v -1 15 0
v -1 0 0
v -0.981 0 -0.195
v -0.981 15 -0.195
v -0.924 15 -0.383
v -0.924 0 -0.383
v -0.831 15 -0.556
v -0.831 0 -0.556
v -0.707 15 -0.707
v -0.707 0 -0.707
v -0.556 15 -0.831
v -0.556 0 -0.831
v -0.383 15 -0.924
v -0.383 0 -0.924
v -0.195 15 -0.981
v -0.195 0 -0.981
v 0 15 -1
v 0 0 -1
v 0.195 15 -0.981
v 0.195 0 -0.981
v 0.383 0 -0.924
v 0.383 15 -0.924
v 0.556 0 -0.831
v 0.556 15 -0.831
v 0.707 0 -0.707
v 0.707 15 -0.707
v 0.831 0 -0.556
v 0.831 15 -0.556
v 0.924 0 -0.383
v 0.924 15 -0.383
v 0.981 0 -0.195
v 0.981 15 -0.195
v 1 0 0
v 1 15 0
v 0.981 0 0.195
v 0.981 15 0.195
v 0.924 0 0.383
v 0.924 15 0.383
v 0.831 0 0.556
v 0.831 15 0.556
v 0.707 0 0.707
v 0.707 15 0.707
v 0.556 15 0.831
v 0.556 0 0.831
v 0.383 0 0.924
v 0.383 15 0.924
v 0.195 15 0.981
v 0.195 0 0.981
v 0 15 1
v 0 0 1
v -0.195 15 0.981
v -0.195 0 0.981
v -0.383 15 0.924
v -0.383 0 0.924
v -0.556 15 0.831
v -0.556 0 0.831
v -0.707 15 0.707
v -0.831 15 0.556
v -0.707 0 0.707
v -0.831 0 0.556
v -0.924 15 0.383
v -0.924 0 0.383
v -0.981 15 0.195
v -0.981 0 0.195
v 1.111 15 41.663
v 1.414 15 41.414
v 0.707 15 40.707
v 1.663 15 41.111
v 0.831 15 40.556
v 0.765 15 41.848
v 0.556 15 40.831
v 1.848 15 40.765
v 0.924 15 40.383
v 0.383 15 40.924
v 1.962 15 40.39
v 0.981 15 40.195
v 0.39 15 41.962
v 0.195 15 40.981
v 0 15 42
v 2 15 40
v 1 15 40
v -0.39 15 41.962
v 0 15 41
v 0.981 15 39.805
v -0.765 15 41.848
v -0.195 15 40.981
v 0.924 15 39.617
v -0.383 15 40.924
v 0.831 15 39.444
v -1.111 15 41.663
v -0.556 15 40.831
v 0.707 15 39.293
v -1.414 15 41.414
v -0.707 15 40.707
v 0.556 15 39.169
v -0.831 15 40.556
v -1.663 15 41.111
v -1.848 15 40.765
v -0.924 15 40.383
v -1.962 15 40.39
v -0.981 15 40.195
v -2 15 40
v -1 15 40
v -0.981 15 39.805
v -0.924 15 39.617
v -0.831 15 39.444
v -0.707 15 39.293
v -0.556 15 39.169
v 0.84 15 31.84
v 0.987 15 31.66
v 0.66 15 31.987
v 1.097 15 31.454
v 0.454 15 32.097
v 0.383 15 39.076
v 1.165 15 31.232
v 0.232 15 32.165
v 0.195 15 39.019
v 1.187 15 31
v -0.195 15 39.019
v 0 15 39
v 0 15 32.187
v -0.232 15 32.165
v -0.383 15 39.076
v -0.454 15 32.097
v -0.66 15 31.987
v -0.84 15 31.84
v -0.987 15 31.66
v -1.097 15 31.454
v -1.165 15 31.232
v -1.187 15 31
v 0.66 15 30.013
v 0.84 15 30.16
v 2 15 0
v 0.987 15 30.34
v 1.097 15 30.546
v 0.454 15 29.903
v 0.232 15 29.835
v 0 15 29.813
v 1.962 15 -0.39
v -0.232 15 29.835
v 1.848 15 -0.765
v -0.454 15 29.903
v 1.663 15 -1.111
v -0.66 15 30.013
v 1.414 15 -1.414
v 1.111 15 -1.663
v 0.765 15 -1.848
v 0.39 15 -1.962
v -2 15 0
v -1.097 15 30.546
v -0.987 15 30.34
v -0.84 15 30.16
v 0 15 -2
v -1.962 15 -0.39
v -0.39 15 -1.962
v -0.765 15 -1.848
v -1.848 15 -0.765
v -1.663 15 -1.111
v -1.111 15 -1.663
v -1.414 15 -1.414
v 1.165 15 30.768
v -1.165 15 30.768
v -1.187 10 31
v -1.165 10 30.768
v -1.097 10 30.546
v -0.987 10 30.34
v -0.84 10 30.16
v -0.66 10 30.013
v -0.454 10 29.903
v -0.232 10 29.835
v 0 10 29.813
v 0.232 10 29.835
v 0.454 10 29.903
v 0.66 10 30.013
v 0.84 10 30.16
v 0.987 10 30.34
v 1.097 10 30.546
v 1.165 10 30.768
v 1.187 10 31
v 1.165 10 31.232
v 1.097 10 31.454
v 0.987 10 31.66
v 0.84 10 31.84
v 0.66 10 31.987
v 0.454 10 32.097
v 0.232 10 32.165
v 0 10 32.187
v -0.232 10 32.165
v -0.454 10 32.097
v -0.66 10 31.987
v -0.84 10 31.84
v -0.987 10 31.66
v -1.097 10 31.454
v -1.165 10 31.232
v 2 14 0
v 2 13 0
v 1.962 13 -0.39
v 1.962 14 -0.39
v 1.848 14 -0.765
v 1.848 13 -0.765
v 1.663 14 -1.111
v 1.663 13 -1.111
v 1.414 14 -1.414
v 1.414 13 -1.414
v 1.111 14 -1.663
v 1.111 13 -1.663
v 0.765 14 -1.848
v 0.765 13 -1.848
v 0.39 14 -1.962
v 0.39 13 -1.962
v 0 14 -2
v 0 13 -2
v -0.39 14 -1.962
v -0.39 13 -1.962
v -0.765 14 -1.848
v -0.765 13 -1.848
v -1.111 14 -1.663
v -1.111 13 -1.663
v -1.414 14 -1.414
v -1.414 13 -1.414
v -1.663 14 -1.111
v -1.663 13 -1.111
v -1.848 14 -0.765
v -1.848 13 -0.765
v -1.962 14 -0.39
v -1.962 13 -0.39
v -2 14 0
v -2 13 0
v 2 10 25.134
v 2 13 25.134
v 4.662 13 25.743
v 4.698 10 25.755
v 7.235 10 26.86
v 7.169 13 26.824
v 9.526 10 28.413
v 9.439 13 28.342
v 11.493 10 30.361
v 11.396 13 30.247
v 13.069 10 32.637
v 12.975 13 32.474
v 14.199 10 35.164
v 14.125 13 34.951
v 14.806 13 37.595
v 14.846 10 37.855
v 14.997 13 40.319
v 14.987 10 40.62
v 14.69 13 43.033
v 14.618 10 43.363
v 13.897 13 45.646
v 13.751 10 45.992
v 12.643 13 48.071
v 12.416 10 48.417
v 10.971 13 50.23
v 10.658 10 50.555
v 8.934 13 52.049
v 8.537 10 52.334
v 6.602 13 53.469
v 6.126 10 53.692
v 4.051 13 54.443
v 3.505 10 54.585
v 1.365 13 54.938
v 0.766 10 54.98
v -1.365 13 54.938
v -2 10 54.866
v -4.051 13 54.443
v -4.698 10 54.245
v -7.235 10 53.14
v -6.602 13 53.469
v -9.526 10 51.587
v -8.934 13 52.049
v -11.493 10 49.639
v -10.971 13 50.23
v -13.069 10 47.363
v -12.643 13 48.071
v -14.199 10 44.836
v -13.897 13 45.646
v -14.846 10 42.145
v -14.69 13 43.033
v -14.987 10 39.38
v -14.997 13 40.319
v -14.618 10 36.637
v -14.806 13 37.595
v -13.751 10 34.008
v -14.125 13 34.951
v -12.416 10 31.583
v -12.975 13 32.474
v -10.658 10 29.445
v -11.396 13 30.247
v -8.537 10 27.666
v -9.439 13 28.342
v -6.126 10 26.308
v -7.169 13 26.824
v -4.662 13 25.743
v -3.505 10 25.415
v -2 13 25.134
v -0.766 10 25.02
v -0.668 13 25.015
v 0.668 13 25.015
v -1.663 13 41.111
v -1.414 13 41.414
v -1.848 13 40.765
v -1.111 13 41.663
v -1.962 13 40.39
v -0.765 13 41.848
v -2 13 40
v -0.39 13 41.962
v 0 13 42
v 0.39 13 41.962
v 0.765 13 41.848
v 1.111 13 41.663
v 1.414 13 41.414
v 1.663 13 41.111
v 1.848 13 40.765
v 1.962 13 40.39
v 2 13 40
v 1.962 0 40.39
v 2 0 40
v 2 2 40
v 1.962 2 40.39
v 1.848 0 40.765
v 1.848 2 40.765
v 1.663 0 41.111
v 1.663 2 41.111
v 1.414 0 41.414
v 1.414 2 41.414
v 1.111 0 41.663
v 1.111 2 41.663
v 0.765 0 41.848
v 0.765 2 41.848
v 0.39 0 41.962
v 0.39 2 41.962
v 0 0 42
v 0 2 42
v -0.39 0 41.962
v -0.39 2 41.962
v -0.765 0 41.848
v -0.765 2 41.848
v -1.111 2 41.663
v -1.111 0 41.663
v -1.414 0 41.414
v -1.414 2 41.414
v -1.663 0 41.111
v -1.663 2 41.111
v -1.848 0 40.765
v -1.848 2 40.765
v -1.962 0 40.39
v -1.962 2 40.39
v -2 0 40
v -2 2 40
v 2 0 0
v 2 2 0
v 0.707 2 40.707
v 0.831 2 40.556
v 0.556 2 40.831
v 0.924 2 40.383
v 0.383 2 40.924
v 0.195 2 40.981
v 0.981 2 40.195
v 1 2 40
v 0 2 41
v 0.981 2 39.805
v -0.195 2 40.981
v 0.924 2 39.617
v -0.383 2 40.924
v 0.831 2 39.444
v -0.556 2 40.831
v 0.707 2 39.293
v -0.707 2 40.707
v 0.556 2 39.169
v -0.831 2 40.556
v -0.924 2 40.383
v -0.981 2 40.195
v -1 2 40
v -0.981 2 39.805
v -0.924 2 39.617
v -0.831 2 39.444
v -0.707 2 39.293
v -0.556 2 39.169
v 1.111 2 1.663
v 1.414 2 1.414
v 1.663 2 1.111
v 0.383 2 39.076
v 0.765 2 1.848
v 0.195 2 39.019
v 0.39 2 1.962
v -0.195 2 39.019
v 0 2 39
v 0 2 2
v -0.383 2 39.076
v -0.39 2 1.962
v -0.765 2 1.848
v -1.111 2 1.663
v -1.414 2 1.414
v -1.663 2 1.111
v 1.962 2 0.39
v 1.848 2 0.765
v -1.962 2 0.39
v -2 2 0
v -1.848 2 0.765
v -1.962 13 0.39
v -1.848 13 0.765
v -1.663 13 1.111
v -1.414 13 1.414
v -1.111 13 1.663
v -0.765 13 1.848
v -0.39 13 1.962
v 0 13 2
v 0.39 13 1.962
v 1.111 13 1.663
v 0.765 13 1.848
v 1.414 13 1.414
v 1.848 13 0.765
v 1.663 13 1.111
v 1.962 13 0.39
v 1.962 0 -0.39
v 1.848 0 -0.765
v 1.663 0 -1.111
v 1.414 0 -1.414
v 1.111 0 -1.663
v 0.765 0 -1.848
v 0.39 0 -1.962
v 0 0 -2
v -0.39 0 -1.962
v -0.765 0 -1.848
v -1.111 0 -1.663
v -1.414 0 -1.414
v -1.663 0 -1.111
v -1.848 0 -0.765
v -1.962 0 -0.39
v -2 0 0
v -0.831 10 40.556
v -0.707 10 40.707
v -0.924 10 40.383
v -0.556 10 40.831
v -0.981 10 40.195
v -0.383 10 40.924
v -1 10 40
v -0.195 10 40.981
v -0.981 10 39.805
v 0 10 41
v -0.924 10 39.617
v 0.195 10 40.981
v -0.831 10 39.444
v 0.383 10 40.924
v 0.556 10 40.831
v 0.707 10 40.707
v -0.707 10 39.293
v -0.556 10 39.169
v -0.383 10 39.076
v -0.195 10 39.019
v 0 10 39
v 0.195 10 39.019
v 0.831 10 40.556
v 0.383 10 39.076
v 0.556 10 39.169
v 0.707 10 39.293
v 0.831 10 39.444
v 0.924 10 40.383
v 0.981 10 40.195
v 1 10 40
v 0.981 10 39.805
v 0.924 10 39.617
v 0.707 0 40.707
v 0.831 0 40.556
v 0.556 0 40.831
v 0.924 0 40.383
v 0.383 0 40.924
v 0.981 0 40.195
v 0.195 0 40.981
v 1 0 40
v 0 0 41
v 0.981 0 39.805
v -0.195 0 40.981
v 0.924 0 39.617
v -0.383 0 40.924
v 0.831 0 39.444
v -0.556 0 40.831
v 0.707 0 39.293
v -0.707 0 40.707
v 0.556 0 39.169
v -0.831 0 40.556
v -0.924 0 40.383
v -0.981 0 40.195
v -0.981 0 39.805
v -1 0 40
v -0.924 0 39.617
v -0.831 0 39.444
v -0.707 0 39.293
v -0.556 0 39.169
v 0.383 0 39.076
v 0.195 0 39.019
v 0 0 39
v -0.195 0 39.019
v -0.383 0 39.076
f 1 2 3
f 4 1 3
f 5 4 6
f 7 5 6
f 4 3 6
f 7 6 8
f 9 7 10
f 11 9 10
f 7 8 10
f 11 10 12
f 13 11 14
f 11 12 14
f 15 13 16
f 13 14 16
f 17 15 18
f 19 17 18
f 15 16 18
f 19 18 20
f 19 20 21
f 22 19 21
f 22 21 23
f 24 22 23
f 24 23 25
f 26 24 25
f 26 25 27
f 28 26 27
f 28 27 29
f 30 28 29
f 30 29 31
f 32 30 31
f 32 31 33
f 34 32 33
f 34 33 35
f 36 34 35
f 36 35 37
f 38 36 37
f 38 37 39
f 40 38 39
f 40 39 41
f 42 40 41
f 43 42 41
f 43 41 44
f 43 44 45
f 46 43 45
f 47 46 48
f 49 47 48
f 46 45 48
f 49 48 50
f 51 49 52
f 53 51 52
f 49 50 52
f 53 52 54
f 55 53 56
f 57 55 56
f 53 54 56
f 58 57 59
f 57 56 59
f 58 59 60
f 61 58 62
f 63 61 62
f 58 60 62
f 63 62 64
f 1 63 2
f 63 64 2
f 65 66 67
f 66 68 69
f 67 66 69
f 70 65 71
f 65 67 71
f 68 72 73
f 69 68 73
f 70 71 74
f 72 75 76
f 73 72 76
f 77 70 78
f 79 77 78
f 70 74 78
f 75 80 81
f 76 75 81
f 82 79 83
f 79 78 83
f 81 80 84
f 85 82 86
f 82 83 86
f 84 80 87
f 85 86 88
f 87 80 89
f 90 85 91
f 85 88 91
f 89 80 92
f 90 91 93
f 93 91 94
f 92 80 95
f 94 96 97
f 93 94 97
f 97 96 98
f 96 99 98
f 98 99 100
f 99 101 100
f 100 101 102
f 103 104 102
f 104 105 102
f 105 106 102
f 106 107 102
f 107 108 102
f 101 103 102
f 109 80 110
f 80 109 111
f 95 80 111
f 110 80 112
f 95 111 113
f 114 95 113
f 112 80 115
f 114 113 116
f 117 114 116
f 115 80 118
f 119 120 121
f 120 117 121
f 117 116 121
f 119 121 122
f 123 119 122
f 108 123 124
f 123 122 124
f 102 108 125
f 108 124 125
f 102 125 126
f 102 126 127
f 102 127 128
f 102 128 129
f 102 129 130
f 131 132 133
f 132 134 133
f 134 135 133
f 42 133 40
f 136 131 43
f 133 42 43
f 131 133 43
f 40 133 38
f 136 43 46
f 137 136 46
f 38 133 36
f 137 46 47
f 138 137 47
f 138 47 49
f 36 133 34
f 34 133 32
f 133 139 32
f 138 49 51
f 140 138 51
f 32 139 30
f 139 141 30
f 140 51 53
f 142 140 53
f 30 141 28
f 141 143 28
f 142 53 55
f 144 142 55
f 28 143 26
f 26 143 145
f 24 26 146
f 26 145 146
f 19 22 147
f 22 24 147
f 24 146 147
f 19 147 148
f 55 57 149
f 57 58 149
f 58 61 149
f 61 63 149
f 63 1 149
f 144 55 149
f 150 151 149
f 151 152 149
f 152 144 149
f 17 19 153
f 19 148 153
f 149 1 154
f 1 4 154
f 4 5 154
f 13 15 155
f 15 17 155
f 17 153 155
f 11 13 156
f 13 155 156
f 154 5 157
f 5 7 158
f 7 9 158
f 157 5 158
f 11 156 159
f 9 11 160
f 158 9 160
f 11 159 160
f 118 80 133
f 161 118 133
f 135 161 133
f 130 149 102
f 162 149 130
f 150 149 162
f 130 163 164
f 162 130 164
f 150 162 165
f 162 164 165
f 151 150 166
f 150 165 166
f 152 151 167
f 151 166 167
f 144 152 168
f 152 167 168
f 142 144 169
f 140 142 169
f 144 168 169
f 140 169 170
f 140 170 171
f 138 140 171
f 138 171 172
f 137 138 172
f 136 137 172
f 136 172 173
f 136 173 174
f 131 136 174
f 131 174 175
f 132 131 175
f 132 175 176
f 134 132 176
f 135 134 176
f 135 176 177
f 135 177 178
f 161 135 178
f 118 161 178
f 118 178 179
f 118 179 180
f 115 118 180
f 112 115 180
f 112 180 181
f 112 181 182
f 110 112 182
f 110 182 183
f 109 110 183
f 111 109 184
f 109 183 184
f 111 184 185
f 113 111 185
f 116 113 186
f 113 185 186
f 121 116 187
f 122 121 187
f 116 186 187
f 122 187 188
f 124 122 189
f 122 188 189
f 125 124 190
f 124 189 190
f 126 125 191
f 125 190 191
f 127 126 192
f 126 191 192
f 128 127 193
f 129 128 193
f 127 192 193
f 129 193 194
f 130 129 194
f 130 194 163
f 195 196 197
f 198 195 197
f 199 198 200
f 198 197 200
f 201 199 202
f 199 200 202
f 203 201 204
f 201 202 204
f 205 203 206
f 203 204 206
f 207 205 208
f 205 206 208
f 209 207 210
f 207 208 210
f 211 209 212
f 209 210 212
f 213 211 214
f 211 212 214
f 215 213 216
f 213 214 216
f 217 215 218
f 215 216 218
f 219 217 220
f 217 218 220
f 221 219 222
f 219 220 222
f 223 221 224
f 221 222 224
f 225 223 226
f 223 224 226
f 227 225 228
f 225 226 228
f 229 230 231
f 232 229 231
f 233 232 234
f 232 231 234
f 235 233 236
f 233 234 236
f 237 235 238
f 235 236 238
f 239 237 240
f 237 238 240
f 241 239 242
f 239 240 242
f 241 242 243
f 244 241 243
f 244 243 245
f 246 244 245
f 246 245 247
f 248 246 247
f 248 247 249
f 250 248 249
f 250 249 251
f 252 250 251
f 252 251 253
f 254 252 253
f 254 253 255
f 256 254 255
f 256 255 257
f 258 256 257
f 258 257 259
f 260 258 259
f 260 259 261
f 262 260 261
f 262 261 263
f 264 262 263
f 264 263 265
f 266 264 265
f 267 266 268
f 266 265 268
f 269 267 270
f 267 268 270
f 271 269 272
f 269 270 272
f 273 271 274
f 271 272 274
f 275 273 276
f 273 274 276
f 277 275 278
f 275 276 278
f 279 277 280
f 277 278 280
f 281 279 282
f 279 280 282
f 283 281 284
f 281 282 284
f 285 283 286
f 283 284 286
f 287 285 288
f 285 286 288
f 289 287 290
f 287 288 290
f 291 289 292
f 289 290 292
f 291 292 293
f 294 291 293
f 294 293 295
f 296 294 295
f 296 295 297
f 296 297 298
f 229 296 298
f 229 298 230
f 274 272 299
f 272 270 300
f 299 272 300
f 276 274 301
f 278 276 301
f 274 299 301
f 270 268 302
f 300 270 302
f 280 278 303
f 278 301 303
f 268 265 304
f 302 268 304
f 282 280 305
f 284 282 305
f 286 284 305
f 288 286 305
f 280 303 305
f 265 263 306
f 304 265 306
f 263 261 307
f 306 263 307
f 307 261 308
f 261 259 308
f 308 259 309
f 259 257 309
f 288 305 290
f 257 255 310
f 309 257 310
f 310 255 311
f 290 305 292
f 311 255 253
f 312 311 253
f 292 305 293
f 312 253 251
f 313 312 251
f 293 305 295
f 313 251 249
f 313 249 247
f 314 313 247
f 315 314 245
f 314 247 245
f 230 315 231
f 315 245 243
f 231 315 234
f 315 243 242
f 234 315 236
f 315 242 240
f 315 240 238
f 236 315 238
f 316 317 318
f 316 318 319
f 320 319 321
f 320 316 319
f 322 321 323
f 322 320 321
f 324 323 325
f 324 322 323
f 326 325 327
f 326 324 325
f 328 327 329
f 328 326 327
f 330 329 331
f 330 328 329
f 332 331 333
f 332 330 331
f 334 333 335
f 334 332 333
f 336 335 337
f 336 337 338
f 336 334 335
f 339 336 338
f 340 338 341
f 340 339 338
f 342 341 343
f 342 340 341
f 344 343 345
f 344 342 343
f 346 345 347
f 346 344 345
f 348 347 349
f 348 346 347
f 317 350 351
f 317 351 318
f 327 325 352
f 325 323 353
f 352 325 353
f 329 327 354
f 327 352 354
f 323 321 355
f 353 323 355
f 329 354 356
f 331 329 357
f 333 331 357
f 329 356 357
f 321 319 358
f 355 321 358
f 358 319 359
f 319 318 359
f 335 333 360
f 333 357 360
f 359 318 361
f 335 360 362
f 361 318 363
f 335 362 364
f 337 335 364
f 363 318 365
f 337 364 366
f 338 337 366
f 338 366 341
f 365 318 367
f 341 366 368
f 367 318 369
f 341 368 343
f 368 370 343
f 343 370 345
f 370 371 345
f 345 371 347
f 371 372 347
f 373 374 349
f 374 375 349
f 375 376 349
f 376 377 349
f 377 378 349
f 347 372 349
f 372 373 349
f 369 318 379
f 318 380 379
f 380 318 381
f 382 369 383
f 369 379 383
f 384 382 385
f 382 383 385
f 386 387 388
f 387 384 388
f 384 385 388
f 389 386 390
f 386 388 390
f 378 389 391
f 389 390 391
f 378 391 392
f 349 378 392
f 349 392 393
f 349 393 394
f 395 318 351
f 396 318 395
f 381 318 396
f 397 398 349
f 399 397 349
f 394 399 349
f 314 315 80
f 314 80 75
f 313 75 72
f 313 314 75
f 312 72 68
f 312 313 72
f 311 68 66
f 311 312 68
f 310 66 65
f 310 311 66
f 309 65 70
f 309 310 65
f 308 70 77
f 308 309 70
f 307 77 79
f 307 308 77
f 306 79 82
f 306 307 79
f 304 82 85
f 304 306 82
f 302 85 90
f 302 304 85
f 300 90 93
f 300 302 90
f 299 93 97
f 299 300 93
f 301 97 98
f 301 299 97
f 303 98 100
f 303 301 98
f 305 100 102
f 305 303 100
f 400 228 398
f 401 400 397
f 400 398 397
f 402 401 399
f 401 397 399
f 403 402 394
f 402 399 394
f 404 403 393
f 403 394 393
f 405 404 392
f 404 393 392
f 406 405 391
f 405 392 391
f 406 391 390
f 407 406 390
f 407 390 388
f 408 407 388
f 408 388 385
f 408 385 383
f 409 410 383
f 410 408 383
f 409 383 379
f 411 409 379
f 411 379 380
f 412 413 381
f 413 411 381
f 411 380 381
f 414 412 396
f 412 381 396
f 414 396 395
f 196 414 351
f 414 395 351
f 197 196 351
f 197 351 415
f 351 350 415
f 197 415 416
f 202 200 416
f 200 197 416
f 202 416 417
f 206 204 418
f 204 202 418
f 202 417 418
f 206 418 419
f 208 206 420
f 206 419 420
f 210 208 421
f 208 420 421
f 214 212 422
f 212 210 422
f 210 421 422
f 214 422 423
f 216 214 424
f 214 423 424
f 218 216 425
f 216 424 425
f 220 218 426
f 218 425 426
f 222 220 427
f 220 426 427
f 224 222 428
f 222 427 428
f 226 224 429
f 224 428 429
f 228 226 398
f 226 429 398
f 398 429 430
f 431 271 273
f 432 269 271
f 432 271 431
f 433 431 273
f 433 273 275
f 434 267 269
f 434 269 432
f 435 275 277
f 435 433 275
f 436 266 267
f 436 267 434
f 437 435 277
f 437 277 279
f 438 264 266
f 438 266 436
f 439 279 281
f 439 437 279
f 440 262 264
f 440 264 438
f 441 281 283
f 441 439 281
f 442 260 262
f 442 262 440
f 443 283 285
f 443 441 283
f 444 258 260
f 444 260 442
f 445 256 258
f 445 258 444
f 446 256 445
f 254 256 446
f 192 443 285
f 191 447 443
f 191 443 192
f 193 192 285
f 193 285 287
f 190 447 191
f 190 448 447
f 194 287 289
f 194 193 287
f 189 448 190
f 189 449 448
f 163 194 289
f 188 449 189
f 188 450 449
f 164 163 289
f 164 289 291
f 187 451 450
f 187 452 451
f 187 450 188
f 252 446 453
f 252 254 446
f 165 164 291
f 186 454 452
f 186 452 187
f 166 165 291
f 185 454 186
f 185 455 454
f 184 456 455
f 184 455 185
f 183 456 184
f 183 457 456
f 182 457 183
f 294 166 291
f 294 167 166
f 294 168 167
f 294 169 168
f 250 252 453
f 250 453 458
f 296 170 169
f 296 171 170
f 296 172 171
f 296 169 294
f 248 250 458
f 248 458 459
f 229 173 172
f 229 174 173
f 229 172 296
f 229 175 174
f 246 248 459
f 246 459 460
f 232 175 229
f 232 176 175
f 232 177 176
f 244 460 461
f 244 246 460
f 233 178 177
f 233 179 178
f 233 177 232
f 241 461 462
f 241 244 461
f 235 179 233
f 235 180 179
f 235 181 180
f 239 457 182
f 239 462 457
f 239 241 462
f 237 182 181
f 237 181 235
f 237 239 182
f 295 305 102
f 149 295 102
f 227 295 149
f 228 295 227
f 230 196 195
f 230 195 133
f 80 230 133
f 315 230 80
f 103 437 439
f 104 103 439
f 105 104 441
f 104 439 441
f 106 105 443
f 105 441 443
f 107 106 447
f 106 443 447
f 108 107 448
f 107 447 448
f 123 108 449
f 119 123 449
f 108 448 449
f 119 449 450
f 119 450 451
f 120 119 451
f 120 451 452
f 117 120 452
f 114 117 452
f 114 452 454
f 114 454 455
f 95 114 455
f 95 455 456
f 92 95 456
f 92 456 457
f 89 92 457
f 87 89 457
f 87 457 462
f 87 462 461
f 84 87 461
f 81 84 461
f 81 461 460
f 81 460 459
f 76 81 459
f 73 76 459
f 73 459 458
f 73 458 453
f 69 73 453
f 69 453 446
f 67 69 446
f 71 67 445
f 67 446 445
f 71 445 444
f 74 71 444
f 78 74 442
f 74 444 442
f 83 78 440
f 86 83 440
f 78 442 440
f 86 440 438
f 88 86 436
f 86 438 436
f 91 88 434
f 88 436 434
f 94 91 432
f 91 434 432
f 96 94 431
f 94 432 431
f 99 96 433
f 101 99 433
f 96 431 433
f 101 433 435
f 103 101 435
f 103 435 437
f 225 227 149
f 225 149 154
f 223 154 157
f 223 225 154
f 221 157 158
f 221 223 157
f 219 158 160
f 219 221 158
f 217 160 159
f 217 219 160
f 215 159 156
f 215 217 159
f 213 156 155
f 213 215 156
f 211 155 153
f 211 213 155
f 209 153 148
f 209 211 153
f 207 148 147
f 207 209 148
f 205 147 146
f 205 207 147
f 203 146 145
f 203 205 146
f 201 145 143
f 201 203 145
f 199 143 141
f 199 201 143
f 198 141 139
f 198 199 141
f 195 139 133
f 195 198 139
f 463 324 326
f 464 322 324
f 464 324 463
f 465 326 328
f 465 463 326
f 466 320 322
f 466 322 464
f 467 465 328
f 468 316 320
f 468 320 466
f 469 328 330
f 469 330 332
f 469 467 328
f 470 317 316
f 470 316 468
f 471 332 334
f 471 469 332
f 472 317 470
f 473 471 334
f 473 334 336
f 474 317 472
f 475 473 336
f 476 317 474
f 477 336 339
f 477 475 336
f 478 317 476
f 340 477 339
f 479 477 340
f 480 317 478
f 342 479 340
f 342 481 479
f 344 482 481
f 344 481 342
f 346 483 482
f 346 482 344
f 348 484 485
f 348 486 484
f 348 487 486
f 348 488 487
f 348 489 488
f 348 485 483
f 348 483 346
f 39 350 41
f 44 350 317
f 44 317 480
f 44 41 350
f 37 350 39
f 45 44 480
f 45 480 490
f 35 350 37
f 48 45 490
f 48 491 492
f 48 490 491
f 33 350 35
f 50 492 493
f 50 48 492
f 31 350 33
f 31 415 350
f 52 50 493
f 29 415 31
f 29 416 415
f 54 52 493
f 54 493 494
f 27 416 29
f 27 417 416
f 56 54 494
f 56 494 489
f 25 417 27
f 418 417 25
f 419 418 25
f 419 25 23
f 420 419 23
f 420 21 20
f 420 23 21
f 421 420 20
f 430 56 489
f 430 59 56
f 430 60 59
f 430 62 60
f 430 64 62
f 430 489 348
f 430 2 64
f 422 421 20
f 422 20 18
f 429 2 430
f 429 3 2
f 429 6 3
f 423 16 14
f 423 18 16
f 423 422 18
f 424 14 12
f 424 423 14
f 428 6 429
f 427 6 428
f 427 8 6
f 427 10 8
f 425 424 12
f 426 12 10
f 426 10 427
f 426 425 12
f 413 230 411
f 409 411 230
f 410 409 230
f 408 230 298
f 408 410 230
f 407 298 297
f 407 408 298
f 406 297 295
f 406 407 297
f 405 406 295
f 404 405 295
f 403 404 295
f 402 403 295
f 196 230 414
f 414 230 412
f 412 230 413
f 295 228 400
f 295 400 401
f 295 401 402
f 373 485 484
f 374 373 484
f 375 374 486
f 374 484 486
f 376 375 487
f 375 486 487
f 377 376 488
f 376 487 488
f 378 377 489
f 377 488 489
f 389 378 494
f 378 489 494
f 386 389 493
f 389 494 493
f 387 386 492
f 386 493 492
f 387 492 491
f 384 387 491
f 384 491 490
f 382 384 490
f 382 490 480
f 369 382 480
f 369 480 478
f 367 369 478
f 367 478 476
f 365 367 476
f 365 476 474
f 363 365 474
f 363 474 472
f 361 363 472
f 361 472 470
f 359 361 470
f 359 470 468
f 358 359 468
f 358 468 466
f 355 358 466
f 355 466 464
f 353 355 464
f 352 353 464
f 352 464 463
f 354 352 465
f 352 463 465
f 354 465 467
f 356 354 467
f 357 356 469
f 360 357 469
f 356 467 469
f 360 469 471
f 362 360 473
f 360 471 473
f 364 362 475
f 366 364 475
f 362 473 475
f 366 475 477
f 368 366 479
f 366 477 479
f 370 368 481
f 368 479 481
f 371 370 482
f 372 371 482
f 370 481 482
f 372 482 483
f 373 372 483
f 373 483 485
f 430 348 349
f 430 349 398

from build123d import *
from build123d.topology import SkipClean

# Parameters (mm, degrees)
BOSS_EXTRUDE1_DEPTH             = 2
SKETCH2_R                       = 2
BOSS_EXTRUDE2_DEPTH             = 12
BOSS_EXTRUDE3_START             = 13
BOSS_EXTRUDE3_DEPTH             = 2
SKETCH7_R                       = 15
BOSS_EXTRUDE5_DEPTH             = 3
F_2_0MM_CLEARANCE_DOWEL_HOLE1_D = 2
F_4_48_TAPPED_HOLE1_D           = 2.3749
F_4_48_TAPPED_HOLE1_DEPTH       = 7.27
F_4_48_TAPPED_HOLE1_TIP         = 0.713491942


with BuildPart() as part:
    # Sketch1 → Boss-Extrude1 (new body)
    with BuildSketch(Plane(origin=(0, 0, 0), x_dir=(1, 0, 0), z_dir=(0, 1, 0))):
        with BuildLine():
            Line((2, 0), (2, -40))
            ThreePointArc((2, -40), (0, -42), (-2, -40))
            Line((-2, -40), (-2, 0))
            ThreePointArc((-2, 0), (0, 2), (2, 0))
        make_face()
    extrude(amount=BOSS_EXTRUDE1_DEPTH)

    # Sketch2 → Boss-Extrude2 (add)
    with SkipClean():  # the faces are left unmerged after this step: merging them gives an invalid solid
        with BuildSketch(Plane(origin=(0, 2, 0), x_dir=(1, 0, 0), z_dir=(0, 1, 0))):
            Circle(SKETCH2_R)
        extrude(amount=BOSS_EXTRUDE2_DEPTH)
    add(part.part.scale(1), mode=Mode.REPLACE)  # the faces are merged on a copy

    # Sketch1<3> → Boss-Extrude3 (add)
    with BuildSketch(Plane(origin=(0, 0, 0), x_dir=(1, 0, 0), z_dir=(0, 1, 0)).offset(BOSS_EXTRUDE3_START)):
        with BuildLine():
            Line((2, 0), (2, -40))
            ThreePointArc((2, -40), (0, -42), (-2, -40))
            Line((-2, -40), (-2, 0))
            ThreePointArc((-2, 0), (0, 2), (2, 0))
        make_face()
    extrude(amount=BOSS_EXTRUDE3_DEPTH)

    # Sketch7 → Boss-Extrude5 (add)
    with BuildSketch(Plane.XZ.offset(-13)):
        with Locations((0, 40)):
            Circle(SKETCH7_R)
    extrude(amount=BOSS_EXTRUDE5_DEPTH)

    # Ø2.0mm Clearance Dowel Hole1 (through all)
    with Locations(Plane(origin=(0, 15, 0), x_dir=(1, 0, 0), z_dir=(0, 1, 0))):
        with Locations((0, 0), (0, -40)):
            Hole(F_2_0MM_CLEARANCE_DOWEL_HOLE1_D / 2)

    # #4-48 Tapped Hole1
    with Locations(Plane(origin=(0, 15, 0), x_dir=(1, 0, 0), z_dir=(0, 1, 0))):
        with Locations((0, -31)):
            Hole(F_4_48_TAPPED_HOLE1_D / 2, depth=F_4_48_TAPPED_HOLE1_DEPTH)
            with Locations((0, 0, -(F_4_48_TAPPED_HOLE1_DEPTH + F_4_48_TAPPED_HOLE1_TIP / 2))):  # 118° drill point
                Cone(0, F_4_48_TAPPED_HOLE1_D / 2, F_4_48_TAPPED_HOLE1_TIP, mode=Mode.SUBTRACT)


solid = part.part
